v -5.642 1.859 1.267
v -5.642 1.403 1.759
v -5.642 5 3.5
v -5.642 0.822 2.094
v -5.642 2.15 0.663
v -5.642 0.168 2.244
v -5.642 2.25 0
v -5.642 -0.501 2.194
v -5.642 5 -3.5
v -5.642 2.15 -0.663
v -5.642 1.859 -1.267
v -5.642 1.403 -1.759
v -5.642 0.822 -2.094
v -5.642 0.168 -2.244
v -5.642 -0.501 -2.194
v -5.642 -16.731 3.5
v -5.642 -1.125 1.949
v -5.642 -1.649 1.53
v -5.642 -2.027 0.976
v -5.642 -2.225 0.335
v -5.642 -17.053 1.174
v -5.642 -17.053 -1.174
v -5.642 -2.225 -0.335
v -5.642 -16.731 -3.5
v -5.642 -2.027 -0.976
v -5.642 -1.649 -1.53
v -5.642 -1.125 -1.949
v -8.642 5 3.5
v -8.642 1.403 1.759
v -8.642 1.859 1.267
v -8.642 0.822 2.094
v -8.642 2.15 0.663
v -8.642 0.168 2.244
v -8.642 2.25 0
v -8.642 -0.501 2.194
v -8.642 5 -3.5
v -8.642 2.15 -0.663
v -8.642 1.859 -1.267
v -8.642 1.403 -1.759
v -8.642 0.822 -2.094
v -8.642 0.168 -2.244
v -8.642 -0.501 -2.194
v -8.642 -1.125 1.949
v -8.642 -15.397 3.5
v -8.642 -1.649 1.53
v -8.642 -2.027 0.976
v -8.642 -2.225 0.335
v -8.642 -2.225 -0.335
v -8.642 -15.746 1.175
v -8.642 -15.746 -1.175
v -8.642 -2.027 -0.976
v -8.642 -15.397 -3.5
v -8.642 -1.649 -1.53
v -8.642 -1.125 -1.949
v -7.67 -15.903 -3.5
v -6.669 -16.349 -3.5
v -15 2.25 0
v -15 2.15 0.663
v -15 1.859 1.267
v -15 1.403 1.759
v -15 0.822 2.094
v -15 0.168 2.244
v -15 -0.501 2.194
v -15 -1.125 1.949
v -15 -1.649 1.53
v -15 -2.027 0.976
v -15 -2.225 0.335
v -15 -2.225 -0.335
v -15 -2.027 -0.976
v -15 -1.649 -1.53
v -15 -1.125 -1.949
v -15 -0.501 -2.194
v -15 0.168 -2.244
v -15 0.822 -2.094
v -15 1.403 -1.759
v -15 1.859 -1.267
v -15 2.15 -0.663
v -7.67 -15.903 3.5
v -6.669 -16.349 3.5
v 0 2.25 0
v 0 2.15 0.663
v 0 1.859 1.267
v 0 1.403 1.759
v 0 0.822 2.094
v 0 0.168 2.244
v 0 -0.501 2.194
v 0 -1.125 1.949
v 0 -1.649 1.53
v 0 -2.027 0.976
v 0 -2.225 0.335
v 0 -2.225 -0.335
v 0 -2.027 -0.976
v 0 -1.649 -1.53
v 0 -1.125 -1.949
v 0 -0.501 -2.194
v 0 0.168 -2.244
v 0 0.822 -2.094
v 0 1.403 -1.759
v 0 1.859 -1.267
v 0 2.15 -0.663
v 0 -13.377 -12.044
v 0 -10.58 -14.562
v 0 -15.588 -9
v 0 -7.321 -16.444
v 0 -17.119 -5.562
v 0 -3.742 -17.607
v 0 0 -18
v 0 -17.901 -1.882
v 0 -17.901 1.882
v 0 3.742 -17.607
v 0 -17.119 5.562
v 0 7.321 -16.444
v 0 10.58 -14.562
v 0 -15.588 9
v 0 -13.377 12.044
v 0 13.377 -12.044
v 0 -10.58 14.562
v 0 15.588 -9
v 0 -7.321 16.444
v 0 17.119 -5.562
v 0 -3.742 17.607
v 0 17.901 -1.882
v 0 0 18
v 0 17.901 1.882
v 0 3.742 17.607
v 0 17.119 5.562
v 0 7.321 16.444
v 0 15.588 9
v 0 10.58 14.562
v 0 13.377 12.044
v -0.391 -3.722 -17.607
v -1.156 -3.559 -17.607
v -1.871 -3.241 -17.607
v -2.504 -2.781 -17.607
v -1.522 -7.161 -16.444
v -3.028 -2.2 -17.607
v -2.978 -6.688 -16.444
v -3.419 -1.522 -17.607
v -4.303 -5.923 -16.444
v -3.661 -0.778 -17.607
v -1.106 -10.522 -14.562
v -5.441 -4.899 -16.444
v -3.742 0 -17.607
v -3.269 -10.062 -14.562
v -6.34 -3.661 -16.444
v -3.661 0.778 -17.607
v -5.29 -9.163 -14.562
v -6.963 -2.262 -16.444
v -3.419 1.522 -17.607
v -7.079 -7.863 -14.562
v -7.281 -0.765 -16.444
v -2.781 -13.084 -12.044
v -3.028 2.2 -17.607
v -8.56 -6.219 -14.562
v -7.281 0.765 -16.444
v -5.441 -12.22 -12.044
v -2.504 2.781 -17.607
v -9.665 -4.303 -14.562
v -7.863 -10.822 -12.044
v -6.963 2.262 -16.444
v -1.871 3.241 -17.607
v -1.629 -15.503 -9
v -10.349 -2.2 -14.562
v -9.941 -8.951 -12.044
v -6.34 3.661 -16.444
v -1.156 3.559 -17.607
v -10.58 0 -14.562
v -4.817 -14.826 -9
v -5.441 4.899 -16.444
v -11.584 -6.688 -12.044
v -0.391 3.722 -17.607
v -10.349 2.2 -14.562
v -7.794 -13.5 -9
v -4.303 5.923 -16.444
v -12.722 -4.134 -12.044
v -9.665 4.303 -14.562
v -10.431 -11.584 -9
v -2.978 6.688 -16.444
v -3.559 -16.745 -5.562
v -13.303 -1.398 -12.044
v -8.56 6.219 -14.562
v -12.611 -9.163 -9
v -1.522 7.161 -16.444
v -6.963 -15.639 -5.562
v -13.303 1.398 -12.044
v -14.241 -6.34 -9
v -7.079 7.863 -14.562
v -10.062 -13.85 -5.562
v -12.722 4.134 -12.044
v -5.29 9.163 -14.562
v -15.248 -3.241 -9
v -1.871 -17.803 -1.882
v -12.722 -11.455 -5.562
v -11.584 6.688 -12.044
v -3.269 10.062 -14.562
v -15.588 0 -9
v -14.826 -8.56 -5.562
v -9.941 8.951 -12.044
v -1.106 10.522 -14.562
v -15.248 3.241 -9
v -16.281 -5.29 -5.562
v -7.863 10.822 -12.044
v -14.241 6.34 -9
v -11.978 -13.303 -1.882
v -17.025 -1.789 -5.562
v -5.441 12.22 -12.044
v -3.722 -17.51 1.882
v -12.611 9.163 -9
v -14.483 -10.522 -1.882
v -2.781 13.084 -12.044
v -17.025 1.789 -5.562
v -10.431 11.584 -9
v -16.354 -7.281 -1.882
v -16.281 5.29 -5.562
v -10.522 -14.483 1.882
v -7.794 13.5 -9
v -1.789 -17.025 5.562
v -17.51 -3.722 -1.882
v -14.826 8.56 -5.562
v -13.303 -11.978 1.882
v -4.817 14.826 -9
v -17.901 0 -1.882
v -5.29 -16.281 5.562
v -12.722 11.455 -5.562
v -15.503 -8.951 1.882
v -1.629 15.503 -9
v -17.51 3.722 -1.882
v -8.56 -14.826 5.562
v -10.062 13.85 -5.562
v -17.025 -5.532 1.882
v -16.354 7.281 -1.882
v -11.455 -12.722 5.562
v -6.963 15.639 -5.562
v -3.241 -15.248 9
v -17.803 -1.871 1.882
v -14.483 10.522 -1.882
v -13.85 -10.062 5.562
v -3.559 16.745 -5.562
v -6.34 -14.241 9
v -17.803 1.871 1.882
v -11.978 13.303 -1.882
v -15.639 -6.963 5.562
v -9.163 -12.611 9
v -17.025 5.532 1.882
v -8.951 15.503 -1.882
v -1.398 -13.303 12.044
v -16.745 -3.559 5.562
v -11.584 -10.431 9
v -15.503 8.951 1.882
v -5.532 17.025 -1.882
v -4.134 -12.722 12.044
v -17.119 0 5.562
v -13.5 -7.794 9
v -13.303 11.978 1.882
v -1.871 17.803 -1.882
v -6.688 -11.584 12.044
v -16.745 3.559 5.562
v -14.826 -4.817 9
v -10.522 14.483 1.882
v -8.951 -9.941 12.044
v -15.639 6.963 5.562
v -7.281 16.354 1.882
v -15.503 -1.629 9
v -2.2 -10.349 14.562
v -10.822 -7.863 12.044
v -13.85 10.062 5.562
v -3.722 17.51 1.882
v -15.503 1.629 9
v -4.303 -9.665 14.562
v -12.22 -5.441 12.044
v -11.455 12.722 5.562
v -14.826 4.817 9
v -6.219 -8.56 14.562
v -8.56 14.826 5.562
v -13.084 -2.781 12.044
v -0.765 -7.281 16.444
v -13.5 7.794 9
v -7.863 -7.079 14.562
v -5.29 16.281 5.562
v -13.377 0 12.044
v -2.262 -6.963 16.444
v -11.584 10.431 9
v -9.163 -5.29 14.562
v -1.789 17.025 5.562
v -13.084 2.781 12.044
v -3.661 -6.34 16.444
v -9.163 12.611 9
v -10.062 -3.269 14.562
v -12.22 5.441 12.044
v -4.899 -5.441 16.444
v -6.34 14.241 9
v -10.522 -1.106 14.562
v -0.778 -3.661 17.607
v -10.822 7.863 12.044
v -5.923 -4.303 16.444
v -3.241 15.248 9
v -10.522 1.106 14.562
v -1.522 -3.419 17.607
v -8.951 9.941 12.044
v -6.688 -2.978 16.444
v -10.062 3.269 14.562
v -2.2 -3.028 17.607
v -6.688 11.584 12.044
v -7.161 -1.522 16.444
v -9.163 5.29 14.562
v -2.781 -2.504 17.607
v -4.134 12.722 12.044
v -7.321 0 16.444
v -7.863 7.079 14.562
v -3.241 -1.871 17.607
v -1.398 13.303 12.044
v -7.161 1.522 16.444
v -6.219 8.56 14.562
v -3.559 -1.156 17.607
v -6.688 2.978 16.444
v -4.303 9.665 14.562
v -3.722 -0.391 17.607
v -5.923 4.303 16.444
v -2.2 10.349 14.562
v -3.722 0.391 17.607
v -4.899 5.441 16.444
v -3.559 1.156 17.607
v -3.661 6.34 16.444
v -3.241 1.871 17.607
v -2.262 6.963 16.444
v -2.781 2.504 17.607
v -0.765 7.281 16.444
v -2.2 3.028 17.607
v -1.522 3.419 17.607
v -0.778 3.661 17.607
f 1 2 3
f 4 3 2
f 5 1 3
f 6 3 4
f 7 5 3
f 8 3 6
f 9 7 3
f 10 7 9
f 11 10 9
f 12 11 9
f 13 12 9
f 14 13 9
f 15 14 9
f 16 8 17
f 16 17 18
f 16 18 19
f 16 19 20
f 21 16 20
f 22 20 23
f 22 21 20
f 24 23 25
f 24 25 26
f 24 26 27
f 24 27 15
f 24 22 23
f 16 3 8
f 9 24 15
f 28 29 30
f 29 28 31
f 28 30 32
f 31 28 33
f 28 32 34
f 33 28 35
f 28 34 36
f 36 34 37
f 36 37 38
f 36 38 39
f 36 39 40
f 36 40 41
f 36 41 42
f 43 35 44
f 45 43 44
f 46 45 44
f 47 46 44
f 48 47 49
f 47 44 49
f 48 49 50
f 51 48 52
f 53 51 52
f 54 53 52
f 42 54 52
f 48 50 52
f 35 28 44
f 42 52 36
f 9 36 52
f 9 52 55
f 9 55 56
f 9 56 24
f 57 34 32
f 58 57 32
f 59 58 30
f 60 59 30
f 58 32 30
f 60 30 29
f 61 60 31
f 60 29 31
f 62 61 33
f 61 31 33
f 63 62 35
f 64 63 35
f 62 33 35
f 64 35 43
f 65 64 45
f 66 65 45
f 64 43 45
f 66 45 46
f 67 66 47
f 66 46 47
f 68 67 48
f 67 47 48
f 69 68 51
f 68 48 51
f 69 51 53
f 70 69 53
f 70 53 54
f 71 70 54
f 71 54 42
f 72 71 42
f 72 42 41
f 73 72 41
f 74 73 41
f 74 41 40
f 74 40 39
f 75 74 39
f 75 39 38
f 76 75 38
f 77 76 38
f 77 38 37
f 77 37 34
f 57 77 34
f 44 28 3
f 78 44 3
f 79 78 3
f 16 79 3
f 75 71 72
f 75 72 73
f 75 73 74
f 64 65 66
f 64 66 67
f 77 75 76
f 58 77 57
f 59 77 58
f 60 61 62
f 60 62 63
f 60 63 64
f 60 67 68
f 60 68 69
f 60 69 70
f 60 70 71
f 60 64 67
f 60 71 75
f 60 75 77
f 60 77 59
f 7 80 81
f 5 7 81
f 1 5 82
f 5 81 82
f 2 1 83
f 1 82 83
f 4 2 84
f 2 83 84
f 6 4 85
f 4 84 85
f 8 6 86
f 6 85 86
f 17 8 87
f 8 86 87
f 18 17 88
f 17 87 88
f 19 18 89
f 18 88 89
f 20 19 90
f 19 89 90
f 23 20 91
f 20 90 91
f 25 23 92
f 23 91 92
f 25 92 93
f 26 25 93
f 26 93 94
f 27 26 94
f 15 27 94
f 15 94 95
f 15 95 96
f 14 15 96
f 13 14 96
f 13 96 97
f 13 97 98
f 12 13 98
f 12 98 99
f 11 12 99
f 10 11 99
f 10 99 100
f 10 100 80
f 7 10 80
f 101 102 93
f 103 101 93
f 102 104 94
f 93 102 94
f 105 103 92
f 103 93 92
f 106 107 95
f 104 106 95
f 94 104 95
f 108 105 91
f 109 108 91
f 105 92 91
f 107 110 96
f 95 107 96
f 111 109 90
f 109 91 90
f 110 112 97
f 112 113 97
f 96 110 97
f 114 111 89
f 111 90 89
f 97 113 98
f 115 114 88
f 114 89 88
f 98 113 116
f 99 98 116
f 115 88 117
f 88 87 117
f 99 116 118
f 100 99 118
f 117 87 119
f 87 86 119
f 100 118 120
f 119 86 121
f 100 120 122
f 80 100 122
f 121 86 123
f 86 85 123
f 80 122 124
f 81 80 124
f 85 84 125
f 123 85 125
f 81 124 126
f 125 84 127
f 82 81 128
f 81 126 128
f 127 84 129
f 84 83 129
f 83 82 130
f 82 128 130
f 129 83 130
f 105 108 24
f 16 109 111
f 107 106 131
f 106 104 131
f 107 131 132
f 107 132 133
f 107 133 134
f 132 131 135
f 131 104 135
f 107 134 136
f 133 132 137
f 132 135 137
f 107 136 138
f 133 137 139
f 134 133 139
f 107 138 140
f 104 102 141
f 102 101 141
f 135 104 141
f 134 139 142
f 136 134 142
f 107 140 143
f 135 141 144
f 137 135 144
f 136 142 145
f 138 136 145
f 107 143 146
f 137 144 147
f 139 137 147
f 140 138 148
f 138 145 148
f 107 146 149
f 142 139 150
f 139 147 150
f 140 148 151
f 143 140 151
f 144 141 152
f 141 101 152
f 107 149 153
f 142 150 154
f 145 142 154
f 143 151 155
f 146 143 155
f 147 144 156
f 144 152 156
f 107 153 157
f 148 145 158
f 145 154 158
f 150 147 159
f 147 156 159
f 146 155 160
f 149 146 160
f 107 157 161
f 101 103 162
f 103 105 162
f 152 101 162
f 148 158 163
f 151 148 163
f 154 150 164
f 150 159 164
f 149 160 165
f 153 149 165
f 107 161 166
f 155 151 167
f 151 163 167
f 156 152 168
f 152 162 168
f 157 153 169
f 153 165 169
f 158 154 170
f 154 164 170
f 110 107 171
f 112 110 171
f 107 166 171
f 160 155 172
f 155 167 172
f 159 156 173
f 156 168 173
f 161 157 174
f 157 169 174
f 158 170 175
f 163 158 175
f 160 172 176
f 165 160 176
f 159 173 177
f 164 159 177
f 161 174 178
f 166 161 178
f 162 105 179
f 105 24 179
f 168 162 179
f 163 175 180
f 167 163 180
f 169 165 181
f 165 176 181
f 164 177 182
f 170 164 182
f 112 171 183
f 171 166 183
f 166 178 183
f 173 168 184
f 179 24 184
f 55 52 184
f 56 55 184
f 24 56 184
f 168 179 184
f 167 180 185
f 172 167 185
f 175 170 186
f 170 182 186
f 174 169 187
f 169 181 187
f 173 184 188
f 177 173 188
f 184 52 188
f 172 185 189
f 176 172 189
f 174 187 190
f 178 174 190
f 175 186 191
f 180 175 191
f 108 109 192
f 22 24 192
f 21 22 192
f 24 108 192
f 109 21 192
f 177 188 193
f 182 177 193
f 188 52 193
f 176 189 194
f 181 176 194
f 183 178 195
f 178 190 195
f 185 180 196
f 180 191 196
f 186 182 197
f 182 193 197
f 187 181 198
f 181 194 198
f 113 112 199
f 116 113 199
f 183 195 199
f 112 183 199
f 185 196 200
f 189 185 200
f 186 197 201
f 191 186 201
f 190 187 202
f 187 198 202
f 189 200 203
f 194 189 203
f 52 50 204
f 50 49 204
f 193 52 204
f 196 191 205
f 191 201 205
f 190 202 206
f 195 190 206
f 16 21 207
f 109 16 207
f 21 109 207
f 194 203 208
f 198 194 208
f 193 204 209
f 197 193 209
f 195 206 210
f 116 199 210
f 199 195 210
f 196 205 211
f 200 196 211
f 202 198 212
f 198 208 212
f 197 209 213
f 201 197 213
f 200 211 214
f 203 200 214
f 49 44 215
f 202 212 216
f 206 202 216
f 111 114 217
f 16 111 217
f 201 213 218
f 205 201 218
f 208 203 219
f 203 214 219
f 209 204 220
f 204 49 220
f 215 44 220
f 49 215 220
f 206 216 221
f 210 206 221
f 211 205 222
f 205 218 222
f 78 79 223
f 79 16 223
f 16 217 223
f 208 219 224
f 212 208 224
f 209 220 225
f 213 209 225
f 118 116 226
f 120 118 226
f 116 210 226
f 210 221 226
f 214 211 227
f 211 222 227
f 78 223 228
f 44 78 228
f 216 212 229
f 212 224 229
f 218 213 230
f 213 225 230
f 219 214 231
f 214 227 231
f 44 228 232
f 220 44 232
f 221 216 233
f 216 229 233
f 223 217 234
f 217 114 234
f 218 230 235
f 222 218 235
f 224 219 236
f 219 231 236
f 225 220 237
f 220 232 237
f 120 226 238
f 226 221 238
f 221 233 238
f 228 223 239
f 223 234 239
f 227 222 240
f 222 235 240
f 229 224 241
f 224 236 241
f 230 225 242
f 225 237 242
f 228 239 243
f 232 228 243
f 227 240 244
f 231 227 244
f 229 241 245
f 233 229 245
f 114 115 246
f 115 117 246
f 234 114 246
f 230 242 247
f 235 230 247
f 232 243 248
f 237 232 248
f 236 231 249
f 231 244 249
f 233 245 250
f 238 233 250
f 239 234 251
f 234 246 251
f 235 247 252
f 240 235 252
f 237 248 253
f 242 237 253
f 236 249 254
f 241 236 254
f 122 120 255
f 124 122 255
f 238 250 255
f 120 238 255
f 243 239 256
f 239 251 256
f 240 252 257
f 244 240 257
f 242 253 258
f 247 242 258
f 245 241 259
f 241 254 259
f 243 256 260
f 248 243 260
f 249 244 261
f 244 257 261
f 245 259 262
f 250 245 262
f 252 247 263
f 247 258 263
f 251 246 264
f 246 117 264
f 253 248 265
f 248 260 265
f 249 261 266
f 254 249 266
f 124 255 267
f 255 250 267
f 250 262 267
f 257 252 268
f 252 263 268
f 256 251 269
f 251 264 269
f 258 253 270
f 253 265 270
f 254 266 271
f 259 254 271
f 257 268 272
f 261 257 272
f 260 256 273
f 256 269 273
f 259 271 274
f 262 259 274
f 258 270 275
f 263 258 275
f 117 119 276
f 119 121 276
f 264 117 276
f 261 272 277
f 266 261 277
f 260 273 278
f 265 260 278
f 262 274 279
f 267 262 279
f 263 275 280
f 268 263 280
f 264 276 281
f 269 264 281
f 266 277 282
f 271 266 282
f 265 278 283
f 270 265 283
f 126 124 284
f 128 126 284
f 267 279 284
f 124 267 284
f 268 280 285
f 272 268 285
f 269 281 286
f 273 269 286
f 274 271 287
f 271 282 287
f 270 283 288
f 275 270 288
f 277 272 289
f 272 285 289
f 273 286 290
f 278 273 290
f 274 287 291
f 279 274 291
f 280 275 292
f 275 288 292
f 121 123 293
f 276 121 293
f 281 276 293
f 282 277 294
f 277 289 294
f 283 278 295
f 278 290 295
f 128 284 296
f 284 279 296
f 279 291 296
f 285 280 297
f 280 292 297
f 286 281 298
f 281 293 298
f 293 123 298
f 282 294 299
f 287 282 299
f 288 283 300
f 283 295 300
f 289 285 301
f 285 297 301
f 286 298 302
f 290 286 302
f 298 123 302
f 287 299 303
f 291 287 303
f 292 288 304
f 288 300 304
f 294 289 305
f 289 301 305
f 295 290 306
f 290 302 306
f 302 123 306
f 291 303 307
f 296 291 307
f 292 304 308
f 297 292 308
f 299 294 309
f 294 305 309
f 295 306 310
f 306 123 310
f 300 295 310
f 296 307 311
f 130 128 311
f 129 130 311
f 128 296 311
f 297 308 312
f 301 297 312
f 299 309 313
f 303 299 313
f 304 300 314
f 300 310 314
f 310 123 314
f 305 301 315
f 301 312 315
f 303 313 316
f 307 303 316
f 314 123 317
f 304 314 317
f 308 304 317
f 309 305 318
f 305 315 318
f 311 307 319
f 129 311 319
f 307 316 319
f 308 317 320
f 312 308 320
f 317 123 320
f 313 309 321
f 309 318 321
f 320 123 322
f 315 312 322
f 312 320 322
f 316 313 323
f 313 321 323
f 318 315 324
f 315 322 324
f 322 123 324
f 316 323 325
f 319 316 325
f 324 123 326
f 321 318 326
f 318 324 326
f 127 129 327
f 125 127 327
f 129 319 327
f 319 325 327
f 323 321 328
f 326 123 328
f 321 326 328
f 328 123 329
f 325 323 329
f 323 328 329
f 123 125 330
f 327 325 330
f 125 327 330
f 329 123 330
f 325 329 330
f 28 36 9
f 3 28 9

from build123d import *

# Parameters (mm, degrees)
REVOLVE1_ANGLE          = 180
SKETCH2_R               = 2.25
CUT_EXTRUDE1_DEPTH      = 15
CUT_EXTRUDE2_DEPTH      = 5
CUT_EXTRUDE2_DEPTH_BACK = 32.176914536
SKETCH4_W               = 3
SKETCH4_H               = 7


with BuildPart() as part:
    # Sketch1 → Revolve1 (revolve)
    with BuildSketch(Plane(origin=(0, 0, 0), x_dir=(0, 0, -1), z_dir=(1, 0, 0))):
        with BuildLine():
            Line((-18, 0), (18, 0))
            ThreePointArc((18, 0), (0, -18), (-18, 0))
        make_face()
    revolve(axis=Axis((0, 0, 18), (0, 0, -1)), revolution_arc=REVOLVE1_ANGLE)

    # Sketch2 → Cut-Extrude1 (cut)
    with BuildSketch(Plane(origin=(0, 0, 0), x_dir=(0, 0, -1), z_dir=(1, 0, 0))):
        Circle(SKETCH2_R)
    extrude(amount=-CUT_EXTRUDE1_DEPTH, mode=Mode.SUBTRACT)

    # Sketch4 → Cut-Extrude2 (cut, two sides: drawn at the far end of the back side and taken through both)
    with BuildSketch(Plane(origin=(0, 0, 0), x_dir=(1, 0, 0), z_dir=(0, 1, 0)).offset(-CUT_EXTRUDE2_DEPTH_BACK)):
        with Locations((-7.141823204, 0)):
            Rectangle(SKETCH4_W, SKETCH4_H)
    extrude(amount=CUT_EXTRUDE2_DEPTH + CUT_EXTRUDE2_DEPTH_BACK, mode=Mode.SUBTRACT)


solid = part.part
